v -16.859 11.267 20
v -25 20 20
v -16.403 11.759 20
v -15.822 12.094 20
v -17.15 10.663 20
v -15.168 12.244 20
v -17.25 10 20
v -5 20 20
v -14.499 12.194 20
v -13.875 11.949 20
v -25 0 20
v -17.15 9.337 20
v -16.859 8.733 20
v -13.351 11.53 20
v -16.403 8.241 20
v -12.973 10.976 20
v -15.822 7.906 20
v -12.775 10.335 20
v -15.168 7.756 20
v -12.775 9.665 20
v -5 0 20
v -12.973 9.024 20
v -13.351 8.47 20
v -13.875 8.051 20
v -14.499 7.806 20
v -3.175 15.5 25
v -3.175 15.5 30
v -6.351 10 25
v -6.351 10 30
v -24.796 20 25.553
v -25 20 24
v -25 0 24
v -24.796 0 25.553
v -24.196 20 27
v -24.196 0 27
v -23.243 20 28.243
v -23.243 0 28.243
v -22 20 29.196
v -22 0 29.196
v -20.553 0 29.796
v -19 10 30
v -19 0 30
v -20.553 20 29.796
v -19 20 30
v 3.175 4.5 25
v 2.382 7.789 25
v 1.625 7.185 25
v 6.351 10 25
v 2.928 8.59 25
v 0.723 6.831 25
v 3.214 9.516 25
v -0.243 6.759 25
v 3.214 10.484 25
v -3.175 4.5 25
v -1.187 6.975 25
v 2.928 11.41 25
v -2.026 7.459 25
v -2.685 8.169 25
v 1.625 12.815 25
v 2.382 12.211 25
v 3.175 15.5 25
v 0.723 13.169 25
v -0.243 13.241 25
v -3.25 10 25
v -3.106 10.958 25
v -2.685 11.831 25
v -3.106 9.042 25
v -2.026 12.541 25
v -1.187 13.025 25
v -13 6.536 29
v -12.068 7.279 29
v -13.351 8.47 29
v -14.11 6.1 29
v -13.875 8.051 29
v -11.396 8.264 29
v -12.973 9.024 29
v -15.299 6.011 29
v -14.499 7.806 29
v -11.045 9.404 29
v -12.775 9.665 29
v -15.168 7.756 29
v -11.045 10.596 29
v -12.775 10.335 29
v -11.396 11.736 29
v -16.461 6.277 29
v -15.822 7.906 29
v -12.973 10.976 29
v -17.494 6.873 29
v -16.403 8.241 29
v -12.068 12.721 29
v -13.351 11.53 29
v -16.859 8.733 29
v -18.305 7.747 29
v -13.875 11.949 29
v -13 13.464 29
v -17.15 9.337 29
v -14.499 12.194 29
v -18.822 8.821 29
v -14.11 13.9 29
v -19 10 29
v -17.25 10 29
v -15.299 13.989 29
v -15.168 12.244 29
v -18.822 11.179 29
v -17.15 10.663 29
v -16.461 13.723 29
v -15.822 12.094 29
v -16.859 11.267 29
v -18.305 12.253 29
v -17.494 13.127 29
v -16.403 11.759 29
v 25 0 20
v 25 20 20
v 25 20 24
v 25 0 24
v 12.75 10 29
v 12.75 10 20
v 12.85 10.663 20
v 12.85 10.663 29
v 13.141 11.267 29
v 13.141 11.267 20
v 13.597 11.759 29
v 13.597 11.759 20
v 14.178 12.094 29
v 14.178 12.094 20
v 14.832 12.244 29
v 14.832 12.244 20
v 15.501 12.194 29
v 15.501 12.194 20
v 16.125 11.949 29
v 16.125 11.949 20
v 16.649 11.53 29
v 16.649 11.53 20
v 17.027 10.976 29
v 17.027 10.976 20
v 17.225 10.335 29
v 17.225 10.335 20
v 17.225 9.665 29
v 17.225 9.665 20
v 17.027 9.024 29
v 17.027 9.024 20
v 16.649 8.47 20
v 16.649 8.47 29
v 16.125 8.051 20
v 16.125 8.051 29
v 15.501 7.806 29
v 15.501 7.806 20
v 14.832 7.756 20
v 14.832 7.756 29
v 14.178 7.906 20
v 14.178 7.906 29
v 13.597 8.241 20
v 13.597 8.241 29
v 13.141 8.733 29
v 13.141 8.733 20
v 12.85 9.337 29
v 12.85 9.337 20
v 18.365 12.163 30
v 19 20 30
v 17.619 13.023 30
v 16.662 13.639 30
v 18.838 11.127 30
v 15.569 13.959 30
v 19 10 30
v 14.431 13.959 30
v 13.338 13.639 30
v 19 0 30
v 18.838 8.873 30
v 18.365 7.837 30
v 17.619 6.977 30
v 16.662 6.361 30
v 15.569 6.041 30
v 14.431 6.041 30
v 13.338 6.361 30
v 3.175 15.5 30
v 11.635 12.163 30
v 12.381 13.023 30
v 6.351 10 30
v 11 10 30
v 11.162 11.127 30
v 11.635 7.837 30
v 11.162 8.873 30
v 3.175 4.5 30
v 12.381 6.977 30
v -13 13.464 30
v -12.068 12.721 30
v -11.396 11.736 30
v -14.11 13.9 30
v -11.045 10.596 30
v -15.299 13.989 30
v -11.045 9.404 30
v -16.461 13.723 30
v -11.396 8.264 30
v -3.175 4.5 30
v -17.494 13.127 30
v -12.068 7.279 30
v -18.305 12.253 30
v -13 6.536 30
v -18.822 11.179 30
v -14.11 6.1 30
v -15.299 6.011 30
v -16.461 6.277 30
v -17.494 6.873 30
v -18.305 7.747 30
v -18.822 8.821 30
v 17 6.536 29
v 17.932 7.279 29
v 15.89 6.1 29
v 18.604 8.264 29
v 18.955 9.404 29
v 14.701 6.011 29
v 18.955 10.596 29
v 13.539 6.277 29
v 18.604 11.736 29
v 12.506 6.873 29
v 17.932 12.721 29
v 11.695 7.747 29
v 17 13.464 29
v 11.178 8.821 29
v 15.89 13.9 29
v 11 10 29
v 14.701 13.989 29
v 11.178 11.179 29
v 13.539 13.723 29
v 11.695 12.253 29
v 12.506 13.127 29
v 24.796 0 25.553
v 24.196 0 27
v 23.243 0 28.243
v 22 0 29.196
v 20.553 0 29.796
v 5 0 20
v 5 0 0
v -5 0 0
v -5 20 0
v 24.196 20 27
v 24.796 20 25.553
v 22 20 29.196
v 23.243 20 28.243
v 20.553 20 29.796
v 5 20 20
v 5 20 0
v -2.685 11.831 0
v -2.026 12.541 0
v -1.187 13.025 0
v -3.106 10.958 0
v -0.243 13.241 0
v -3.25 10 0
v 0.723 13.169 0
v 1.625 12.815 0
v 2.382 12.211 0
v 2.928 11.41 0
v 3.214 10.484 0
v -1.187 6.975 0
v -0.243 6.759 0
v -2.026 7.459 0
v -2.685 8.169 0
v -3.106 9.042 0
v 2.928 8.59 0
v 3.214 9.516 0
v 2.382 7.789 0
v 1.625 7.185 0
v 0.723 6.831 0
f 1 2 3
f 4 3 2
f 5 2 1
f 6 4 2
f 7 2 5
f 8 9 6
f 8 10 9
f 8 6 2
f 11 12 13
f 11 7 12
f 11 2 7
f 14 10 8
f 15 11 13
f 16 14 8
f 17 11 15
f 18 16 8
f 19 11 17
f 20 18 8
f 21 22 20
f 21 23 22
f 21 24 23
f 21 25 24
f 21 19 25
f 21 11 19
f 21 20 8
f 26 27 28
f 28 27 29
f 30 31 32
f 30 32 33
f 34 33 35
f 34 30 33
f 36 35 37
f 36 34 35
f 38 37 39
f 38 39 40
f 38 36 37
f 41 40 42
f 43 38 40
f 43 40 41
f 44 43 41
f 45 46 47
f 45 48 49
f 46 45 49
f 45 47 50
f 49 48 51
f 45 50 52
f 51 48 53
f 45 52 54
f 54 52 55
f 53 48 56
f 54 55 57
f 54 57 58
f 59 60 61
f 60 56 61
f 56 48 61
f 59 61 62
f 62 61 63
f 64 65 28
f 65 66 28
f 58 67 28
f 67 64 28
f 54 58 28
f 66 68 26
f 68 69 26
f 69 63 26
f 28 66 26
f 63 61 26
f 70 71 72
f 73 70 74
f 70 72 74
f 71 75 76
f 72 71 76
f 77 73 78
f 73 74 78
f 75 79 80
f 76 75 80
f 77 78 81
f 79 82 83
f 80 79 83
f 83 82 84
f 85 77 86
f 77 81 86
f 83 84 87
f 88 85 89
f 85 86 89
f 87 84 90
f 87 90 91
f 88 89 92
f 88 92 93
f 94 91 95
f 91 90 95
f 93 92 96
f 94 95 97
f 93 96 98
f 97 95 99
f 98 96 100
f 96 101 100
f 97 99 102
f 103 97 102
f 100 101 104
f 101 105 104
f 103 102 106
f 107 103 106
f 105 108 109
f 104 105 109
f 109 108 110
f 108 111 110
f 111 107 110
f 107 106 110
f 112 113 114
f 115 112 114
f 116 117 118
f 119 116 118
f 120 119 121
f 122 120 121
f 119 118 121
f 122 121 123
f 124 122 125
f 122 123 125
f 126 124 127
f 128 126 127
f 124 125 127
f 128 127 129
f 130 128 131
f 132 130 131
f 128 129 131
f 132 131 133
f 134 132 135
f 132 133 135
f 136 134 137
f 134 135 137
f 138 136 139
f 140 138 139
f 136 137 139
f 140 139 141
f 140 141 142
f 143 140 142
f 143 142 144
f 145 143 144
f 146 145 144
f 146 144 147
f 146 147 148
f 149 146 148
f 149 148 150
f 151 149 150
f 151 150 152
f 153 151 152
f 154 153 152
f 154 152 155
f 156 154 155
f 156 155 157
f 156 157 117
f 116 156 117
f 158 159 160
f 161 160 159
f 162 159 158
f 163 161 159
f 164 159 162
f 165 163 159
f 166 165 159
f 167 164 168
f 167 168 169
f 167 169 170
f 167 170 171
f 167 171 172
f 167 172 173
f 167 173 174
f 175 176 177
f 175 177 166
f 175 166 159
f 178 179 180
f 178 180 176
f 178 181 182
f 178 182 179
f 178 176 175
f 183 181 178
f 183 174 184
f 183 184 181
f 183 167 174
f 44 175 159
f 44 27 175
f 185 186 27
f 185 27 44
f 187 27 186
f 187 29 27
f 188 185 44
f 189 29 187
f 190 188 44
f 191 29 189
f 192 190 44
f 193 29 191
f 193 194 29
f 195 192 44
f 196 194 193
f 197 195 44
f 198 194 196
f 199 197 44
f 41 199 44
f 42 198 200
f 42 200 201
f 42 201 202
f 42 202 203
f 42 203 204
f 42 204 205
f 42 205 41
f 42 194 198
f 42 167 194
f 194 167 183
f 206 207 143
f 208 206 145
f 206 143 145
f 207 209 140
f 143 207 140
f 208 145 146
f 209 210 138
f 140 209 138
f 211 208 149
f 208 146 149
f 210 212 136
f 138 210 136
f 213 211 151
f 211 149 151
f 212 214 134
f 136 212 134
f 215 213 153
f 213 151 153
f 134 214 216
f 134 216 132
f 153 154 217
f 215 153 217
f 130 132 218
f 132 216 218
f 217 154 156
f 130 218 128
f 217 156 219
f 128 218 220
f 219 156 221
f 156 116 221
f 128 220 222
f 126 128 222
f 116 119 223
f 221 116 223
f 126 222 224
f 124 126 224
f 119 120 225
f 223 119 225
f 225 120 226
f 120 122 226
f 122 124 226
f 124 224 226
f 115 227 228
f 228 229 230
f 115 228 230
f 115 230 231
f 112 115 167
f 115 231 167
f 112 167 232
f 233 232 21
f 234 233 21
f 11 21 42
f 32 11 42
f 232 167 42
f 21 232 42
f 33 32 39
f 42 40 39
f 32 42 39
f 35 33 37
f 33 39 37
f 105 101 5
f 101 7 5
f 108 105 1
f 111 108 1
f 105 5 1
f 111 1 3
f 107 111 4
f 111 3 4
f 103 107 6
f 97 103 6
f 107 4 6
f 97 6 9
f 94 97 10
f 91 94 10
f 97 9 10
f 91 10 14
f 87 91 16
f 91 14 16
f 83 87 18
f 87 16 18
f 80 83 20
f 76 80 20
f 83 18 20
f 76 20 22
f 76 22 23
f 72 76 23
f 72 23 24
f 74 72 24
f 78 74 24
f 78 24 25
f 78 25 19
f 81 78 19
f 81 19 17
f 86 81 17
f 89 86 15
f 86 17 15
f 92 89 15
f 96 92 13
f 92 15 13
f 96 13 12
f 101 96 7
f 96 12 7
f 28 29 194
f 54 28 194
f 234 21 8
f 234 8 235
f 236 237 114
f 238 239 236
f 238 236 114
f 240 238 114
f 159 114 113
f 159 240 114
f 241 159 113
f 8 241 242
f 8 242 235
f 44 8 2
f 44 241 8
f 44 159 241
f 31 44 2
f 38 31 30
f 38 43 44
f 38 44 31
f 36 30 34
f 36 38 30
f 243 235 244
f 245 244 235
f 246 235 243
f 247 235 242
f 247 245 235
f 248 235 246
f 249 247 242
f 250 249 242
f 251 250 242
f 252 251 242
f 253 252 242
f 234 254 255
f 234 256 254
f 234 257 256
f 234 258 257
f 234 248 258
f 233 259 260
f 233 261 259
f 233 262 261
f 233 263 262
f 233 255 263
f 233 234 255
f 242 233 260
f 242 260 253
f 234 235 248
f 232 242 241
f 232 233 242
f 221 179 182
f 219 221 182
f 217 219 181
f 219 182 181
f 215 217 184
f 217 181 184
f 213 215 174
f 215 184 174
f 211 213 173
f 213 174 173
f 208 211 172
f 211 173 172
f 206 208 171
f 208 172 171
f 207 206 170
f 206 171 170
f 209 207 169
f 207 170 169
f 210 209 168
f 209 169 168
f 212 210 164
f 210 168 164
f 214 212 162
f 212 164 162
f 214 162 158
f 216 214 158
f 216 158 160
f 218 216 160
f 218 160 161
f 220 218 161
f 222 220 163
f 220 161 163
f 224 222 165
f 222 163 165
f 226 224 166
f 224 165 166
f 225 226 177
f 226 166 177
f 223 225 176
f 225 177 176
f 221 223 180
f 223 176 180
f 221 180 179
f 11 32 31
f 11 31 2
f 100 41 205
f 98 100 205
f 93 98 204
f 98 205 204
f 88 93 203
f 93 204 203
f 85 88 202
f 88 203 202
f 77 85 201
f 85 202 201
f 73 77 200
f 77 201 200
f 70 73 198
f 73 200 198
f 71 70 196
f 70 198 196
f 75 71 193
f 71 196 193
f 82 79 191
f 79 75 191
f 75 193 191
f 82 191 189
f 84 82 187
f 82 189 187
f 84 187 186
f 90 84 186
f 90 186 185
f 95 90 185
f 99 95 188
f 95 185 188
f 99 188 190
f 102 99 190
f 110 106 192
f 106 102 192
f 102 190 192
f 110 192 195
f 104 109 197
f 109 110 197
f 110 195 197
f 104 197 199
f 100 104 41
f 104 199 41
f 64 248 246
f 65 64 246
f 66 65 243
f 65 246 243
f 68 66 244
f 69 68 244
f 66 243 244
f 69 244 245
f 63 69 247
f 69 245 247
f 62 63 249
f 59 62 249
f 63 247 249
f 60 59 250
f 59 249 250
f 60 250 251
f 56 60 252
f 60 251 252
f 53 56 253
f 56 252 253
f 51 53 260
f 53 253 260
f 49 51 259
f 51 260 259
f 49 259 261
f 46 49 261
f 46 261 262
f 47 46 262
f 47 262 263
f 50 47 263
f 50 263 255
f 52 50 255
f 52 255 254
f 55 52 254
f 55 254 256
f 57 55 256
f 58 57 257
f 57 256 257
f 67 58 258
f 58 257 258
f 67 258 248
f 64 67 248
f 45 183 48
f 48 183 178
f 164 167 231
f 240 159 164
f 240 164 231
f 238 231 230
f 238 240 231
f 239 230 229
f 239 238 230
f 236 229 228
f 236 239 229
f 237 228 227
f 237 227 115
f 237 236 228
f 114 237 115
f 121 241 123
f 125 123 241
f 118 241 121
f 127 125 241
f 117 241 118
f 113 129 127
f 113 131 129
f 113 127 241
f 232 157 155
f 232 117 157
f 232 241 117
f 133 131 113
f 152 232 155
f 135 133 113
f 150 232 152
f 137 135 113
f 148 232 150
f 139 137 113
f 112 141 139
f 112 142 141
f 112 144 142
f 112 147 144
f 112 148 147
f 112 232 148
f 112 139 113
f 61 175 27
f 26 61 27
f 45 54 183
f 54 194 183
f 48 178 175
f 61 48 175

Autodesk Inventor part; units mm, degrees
ref_plane "YZ Plane" through (0, 0, 0) normal (1, 0, 0) x (0, 1, 0)
ref_plane "XZ Plane" through (0, 0, 0) normal (0, 1, 0) x (-1, 0, 0)
ref_plane "XY Plane" through (0, 0, 0) normal (0, 0, 1) x (1, 0, 0)
sketch "Szkic1" plane through (0, 0, 0) normal (0, 1, 0) x (-1, 0, 0)
  line L0 (25, 20) -> (5, 20)
  line L1 (5, 20) -> (5, 0)
  line L2 (5, 0) -> (25, 0)
  line L3 (25, 0) -> (25, 20)
  line L4 (-5, 20) -> (-25, 20)
  line L5 (-25, 20) -> (-25, 0)
  line L6 (-25, 0) -> (-5, 0)
  line L7 (-5, 0) -> (-5, 20)
  line L8 (25, 0) -> (-25, 0)
  line L9 (-25, 0) -> (-25, 30)
  line L10 (-25, 30) -> (25, 30)
  line L11 (25, 30) -> (25, 0)
  point P0 (0, 0)
  point P1 (-15, 20)
  point P2 (15, 20)
  point P3 (15, 0)
  point P4 (-5, 0)
  point P5 (5, 0)
  dimension "d0" = 20
  dimension "d1" = 20
  dimension "d2" = 20
  dimension "d3" = 20
  dimension "d4" = 50
  dimension "d5" = 25
  dimension "d6" = 10
extrude "Wyciągnięcie proste1" add sketch "Szkic1" along normal blind 20 contours L0 L1 L8 L7 L4 L9 L10 L11
sketch "Szkic2" plane through (5, 0, 0) normal (0, 0, -1) x (-1, 0, 0)
  circle A0 centre (5, 10) radius 3.25
  circle A1 centre (20, 10) radius 2.25
  circle A2 centre (-10, 10) radius 2.25
  line L0 (0, 0) -> (0, 20) projected
  line L1 (0, 0) -> (10, 0) projected
  line L2 (-20, 0) -> (-20, 20) projected
  line L3 (-20, 0) -> (0, 0) projected
  line L4 (30, 0) -> (30, 20) projected
  circle A3 centre (-10, 10) radius 4
  circle A4 centre (20, 10) radius 4
  line L5 (1.8246, 15.5) -> (8.1754, 15.5)
  line L6 (8.1754, 15.5) -> (11.3509, 10)
  line L7 (11.3509, 10) -> (8.1754, 4.5)
  line L8 (8.1754, 4.5) -> (1.8246, 4.5)
  line L9 (1.8246, 4.5) -> (-1.3509, 10)
  line L10 (-1.3509, 10) -> (1.8246, 15.5)
  point P0 (5, 0)
  dimension "d9" = 6.5
  dimension "d10" = 5
  dimension "d11" = 10
  dimension "d12" = 10
  dimension "d13" = 10
  dimension "d14" = 10
  dimension "d15" = 4.5
  dimension "d16" = 4.5
  dimension "d20" = 8
  dimension "d21" = 8
  dimension "d25" = 11
extrude "Wyciągnięcie proste2" cut sketch "Szkic2" against normal through all contours A0 | A1 | A2
extrude "Wyciągnięcie proste3" cut sketch "Szkic2" along normal blind 5 from surface at -30 contours A0 | L9 L10 L0 | L0 L10 L5 L6 L7 L8 L9
fillet "Zaokrąglenie1" radius 6 2 edges at (25, 10, 30) (-25, 10, 30)
extrude "Wyciągnięcie proste4" cut sketch "Szkic2" along normal blind 1 from surface at -30 contours A1 | A2 | A3 | A4
properties part number "Z_item_mount" material "Tworzywo sztuczne ABS"
